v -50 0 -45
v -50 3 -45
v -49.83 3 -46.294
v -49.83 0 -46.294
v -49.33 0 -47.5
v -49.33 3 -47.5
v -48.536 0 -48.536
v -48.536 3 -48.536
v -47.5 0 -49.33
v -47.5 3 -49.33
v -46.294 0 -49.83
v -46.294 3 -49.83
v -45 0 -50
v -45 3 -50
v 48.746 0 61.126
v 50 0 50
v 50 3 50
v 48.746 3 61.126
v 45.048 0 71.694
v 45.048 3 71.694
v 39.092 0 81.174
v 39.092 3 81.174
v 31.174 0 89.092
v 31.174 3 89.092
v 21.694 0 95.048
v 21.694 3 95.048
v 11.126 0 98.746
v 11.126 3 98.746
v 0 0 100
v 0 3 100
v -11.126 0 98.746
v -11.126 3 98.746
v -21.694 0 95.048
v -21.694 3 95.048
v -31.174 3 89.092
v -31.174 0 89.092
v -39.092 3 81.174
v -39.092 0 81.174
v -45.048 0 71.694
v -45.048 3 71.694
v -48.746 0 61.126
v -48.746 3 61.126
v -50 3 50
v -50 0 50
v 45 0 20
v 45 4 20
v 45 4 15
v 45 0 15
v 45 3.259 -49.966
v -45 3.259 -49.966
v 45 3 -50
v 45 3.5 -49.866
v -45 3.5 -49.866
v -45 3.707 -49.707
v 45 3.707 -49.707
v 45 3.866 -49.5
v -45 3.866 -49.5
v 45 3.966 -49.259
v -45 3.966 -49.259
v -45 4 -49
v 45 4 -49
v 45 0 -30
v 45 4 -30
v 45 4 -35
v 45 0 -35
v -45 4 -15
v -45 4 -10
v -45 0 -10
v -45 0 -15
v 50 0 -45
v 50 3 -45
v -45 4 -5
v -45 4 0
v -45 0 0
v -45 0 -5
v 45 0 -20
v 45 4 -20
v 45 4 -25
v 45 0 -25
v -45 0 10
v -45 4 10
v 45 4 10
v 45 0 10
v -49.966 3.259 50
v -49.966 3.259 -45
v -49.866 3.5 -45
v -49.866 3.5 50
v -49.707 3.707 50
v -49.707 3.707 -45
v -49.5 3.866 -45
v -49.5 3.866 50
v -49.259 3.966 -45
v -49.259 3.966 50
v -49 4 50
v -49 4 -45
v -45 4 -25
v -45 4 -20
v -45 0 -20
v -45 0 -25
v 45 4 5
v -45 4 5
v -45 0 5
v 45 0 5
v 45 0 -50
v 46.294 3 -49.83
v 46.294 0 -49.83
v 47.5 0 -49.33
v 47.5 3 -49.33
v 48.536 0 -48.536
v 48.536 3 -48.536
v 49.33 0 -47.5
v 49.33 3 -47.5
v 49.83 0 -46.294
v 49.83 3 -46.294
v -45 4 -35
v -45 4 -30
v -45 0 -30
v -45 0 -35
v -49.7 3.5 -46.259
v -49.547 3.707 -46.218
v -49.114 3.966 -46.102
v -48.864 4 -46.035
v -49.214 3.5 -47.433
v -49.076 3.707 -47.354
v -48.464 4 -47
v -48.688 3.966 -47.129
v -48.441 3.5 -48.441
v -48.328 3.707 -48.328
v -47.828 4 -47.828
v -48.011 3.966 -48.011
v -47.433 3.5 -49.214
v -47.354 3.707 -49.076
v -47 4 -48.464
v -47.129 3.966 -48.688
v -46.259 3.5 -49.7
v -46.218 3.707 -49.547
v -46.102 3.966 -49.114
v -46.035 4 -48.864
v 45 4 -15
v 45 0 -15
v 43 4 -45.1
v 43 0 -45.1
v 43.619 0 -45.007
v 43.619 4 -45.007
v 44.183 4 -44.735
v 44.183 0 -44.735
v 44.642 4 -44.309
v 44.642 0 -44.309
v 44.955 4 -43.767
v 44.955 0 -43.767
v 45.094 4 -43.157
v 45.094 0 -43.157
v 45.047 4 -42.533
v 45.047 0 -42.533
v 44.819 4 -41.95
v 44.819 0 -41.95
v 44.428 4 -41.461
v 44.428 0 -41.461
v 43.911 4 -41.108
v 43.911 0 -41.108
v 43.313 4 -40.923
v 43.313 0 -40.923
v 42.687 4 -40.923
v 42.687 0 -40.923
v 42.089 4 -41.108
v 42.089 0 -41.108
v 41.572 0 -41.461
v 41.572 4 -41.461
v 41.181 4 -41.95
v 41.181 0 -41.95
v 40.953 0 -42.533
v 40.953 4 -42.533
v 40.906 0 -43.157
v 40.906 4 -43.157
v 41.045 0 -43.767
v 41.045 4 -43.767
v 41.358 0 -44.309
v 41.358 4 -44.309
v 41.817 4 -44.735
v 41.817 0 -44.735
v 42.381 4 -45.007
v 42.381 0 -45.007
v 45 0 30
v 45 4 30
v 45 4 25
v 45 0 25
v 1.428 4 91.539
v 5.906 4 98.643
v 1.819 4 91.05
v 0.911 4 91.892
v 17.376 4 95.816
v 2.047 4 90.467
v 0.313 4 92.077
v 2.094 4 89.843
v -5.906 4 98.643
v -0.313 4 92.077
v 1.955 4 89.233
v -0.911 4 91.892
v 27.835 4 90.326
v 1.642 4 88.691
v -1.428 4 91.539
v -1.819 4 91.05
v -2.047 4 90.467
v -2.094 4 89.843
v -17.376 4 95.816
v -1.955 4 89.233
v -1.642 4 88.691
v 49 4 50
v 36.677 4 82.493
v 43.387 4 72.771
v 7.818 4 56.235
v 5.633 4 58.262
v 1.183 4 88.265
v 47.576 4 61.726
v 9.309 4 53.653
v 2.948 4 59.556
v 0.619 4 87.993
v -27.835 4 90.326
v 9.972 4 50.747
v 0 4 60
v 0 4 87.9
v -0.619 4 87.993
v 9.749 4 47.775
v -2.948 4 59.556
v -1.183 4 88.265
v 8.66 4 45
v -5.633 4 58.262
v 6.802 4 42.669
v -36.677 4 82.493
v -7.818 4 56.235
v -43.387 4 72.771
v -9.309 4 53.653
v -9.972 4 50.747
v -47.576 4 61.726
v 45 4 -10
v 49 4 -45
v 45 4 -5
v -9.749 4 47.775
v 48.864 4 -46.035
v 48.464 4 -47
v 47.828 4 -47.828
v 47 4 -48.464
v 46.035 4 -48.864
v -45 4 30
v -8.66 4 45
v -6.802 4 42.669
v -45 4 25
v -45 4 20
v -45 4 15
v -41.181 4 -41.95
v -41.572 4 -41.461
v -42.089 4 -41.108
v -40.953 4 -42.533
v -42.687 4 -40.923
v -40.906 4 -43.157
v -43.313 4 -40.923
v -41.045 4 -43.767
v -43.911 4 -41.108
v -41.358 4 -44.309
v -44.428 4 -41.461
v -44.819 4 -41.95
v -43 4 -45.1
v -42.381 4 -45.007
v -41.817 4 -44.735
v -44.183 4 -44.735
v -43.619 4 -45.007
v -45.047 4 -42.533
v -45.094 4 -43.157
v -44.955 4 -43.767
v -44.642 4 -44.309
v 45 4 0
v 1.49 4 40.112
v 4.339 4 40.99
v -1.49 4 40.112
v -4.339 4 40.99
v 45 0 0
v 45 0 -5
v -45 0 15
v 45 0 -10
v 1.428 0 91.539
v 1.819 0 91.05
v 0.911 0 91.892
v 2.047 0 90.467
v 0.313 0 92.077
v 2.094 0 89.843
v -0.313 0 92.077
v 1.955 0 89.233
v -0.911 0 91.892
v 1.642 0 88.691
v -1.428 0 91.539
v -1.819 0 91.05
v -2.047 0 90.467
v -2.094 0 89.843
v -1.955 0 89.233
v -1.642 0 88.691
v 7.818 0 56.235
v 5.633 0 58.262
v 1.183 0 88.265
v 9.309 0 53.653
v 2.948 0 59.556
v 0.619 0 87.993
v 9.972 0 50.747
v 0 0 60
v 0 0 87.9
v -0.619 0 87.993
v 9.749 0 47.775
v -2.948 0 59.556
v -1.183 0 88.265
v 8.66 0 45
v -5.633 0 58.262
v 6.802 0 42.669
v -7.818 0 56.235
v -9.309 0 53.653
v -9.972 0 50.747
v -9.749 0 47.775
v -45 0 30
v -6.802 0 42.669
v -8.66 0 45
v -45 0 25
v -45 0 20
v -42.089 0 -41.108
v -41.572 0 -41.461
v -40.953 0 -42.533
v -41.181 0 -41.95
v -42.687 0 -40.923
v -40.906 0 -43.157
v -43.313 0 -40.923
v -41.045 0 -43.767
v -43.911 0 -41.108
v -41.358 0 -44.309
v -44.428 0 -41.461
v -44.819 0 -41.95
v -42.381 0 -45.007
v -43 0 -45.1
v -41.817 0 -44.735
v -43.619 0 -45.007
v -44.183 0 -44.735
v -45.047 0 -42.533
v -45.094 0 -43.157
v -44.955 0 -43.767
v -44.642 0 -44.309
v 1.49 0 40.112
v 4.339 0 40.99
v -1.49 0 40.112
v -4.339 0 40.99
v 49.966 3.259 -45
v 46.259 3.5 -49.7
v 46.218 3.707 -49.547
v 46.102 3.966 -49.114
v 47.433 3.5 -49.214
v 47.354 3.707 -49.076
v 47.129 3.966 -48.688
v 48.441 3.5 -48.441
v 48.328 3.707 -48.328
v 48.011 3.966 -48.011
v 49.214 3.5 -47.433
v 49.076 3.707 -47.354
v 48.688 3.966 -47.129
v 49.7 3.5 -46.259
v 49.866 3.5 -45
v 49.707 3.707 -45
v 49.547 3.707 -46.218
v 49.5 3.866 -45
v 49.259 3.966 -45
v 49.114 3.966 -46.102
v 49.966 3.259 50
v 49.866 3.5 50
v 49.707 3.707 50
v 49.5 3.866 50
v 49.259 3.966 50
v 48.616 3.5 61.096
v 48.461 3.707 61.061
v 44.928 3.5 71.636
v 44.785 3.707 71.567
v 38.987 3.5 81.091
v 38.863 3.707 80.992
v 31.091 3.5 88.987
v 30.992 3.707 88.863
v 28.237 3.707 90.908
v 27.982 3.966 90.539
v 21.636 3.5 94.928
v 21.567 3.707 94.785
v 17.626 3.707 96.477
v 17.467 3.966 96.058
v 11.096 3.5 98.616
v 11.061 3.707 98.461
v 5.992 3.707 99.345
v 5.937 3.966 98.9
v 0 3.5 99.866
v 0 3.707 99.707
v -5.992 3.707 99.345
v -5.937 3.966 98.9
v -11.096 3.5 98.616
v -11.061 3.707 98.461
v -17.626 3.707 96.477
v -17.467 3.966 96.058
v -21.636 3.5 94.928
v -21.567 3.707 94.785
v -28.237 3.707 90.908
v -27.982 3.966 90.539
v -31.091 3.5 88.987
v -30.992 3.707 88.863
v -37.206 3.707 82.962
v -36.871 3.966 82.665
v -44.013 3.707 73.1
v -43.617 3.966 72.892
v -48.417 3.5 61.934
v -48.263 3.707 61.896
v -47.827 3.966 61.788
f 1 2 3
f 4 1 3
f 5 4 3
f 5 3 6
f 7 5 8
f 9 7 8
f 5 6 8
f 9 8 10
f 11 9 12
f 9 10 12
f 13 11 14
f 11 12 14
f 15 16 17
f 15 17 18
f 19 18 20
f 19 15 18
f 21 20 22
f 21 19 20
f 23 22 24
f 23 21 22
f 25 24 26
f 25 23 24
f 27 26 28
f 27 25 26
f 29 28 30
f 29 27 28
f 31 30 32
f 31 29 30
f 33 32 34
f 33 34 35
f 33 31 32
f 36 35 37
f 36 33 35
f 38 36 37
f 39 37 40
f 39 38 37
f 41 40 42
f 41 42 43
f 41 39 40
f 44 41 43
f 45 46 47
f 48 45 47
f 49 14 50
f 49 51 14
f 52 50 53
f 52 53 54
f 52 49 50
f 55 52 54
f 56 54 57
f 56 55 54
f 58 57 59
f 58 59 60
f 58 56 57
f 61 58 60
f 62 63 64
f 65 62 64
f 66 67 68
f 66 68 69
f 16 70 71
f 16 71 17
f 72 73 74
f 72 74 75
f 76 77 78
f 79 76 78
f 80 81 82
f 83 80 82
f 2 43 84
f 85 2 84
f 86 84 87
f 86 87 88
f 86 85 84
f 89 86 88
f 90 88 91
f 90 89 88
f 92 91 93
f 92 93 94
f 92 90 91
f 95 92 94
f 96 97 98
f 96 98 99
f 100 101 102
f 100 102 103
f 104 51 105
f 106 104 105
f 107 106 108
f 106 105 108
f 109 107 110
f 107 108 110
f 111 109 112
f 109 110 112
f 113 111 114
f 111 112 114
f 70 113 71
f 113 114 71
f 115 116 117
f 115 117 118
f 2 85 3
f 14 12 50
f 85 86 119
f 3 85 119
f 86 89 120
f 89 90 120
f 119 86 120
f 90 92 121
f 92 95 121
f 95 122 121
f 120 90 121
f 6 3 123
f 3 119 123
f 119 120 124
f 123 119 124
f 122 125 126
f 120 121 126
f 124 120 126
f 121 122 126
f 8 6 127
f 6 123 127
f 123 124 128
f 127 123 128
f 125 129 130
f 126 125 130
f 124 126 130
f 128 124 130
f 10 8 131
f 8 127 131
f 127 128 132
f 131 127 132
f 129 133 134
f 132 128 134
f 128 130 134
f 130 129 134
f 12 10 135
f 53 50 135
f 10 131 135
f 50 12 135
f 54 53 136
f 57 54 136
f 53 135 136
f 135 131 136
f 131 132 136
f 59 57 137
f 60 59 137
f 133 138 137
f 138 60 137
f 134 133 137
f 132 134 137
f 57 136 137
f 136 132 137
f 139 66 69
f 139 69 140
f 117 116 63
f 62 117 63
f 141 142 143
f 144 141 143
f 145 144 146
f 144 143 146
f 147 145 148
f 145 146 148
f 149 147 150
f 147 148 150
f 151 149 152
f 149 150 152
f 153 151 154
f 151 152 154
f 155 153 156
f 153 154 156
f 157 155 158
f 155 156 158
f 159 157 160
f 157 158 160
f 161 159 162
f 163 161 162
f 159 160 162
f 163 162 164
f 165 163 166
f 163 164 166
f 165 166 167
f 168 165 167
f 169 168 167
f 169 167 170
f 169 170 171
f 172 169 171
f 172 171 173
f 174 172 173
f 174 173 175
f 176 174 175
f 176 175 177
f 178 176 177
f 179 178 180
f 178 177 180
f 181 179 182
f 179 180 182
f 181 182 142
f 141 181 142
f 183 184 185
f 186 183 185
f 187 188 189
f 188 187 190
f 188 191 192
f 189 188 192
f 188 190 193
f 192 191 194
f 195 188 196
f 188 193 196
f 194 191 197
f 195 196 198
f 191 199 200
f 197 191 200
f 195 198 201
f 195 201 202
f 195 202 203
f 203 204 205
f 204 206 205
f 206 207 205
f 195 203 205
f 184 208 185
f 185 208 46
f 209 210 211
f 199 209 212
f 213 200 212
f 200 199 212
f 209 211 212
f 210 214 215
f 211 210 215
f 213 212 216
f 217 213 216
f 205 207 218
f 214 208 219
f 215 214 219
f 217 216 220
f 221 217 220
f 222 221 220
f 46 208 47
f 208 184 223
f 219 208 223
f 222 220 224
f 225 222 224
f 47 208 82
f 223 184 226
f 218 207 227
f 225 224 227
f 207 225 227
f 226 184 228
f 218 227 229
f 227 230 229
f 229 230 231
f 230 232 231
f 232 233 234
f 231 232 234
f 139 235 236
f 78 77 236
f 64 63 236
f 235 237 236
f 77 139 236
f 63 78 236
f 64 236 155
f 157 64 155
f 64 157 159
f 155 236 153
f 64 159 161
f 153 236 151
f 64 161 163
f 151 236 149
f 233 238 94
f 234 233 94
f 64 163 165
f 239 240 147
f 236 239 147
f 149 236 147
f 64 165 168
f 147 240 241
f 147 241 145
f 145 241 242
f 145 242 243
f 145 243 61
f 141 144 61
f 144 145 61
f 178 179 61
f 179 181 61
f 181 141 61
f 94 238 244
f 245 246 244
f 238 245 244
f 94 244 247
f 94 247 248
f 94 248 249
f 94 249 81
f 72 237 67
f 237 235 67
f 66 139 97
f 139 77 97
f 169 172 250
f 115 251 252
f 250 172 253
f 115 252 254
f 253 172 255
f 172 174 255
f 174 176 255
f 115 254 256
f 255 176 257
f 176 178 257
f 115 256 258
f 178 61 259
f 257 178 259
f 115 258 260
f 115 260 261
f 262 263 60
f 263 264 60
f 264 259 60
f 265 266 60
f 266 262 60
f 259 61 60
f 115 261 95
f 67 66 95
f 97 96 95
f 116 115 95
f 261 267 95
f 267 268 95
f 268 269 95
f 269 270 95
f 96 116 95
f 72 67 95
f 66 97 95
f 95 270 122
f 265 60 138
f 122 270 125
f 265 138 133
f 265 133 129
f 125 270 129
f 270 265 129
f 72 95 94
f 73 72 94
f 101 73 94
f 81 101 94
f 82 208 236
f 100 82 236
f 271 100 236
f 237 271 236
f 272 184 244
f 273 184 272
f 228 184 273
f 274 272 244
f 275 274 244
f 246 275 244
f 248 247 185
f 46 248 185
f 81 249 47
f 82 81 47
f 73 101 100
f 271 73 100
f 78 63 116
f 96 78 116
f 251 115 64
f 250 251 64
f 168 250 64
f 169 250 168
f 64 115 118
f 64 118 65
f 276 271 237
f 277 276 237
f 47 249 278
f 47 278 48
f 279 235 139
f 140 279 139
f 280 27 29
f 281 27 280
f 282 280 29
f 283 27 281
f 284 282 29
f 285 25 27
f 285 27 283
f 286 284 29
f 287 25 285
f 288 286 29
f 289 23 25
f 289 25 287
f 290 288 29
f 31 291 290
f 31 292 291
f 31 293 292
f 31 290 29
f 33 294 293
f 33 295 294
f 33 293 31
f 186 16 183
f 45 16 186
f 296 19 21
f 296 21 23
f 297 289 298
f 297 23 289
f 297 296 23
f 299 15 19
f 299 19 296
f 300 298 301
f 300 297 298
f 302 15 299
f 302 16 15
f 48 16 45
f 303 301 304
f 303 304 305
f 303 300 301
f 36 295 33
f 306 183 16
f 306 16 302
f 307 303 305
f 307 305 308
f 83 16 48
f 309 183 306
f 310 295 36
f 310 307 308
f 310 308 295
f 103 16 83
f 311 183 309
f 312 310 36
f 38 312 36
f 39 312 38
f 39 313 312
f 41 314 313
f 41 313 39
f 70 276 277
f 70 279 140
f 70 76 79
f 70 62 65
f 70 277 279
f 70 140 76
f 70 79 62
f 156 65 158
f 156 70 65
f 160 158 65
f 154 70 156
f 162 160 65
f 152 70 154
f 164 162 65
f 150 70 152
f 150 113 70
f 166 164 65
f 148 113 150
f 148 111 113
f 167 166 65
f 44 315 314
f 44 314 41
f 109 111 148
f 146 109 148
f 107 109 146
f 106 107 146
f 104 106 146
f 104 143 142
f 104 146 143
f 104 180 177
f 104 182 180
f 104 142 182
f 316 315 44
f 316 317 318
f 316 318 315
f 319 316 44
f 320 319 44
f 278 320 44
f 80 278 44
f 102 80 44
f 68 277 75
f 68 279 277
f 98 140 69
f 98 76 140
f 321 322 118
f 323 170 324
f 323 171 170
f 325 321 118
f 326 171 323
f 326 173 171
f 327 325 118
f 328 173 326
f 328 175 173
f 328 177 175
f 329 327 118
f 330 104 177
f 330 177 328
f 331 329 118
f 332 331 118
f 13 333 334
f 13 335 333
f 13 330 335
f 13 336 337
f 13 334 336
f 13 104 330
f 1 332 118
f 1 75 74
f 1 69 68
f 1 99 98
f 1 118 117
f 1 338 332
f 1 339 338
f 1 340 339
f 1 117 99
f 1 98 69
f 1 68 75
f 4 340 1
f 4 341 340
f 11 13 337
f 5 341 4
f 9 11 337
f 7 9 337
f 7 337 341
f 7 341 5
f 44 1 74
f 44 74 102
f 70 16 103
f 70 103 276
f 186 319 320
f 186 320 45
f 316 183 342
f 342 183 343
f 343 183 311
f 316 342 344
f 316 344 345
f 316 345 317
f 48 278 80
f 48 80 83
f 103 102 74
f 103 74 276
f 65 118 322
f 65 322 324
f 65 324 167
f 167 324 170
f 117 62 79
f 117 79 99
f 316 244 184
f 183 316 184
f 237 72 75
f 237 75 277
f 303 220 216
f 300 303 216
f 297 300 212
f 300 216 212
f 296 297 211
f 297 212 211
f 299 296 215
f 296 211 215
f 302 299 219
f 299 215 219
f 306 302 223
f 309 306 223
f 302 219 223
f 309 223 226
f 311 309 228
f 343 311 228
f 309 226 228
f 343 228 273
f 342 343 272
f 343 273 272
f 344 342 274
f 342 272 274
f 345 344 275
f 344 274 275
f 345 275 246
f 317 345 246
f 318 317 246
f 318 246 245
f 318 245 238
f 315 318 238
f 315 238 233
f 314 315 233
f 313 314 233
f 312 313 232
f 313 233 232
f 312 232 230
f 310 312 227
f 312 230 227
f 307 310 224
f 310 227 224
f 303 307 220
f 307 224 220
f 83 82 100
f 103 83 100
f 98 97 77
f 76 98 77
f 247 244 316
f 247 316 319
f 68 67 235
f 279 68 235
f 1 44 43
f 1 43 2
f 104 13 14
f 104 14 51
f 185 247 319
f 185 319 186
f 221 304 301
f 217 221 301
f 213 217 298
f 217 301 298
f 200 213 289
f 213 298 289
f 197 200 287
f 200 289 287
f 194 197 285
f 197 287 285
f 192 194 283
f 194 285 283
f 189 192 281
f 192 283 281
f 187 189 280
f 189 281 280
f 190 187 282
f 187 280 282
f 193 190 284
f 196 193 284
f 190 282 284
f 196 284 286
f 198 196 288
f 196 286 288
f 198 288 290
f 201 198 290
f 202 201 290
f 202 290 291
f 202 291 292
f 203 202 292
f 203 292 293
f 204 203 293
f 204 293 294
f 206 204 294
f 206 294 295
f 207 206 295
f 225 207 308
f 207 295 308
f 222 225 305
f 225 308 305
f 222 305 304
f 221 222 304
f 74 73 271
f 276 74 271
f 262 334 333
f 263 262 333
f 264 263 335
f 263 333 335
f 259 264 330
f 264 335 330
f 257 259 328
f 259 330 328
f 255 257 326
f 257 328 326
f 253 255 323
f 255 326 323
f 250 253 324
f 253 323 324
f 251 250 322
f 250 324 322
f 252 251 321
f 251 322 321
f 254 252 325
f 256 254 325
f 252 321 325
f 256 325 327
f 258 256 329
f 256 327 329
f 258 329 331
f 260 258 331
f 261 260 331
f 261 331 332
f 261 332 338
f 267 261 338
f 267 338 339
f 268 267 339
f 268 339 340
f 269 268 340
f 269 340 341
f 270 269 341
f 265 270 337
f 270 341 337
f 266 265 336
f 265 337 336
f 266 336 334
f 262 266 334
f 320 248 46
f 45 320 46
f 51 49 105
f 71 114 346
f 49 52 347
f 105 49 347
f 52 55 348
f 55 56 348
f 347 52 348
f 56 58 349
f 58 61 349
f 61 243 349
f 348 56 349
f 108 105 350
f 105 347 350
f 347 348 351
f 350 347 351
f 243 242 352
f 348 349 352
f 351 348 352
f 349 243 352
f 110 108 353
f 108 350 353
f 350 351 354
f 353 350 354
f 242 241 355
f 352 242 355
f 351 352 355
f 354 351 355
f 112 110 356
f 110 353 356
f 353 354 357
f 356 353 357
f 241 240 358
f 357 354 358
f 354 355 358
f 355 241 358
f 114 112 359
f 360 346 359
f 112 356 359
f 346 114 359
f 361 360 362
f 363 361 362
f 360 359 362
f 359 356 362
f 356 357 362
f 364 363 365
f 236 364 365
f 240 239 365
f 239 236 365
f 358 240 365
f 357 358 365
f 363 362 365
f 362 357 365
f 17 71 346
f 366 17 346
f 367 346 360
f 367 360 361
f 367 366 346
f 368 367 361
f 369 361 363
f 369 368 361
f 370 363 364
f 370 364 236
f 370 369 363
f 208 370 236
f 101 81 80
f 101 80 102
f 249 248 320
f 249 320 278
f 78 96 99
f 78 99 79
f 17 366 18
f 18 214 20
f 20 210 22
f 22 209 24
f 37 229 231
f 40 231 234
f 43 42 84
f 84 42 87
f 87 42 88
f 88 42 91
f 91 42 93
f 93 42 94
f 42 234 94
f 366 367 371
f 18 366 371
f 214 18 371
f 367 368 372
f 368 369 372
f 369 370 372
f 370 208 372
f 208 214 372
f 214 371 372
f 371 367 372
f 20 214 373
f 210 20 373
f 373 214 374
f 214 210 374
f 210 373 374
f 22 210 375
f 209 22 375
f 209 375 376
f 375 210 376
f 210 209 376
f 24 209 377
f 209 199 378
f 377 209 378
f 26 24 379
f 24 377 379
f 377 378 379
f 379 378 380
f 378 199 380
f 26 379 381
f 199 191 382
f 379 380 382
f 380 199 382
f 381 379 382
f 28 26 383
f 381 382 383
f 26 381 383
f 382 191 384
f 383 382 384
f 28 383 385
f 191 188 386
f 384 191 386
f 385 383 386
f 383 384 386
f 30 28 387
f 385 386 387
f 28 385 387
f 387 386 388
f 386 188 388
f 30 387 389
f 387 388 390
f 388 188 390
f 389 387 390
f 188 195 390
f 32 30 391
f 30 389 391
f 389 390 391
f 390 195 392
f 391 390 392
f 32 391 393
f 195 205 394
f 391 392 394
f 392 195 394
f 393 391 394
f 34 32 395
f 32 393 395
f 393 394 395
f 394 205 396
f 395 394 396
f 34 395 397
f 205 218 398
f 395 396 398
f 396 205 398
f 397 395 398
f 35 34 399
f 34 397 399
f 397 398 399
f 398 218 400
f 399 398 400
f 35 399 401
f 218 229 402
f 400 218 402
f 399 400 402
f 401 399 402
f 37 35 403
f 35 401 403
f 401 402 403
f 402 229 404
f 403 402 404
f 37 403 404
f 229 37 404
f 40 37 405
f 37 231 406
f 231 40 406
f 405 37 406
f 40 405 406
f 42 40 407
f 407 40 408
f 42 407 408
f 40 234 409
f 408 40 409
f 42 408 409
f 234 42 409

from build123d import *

# Parameters (mm, degrees)
EXTRUDE_1_DEPTH     = 4
SKETCH_3_R          = 2.1
CUT_EXTRUDE_1_DEPTH = 4
SKETCH_4_R          = 10
CUT_EXTRUDE_2_DEPTH = 4
SKETCH_5_W          = 90
SKETCH_5_H          = 5
CUT_EXTRUDE_3_DEPTH = 5
FILLET_1_R          = 5
FILLET_2_R          = 1


with BuildPart() as part:
    # 草图2 → 凸台-拉伸1 (new body)
    with BuildSketch(Plane(origin=(0, 0, 0), x_dir=(1, 0, 0), z_dir=(0, 1, 0))):
        with BuildLine():
            Line((-50, -50), (-50, 50))
            Line((-50, 50), (50, 50))
            Line((50, 50), (50, -50))
            ThreePointArc((50, -50), (0, -100), (-50, -50))
        make_face()
    extrude(amount=EXTRUDE_1_DEPTH)

    # 草图3 → 切除-拉伸1 (cut)
    with BuildSketch(Plane.XZ):
        with Locations(Location((0, 90, 0), (0, 0, 270))):
            Circle(SKETCH_3_R)
        with Locations(Location((43, -43, 0), (0, 0, 270))):
            Circle(SKETCH_3_R)
        with Locations(Location((-43, -43, 0), (0, 0, 270))):
            Circle(SKETCH_3_R)
    extrude(amount=-CUT_EXTRUDE_1_DEPTH, mode=Mode.SUBTRACT)

    # 草图4 → 切除-拉伸2 (cut)
    with BuildSketch(Plane(origin=(0, 4, 0), x_dir=(1, 0, 0), z_dir=(0, 1, 0))):
        with Locations(Location((0, -50, 0), (0, 0, 270))):
            Circle(SKETCH_4_R)
    extrude(amount=-CUT_EXTRUDE_2_DEPTH, mode=Mode.SUBTRACT)

    # 草图5 → 切除-拉伸3 (cut)
    with BuildSketch(Plane(origin=(0, 4, 0), x_dir=(1, 0, 0), z_dir=(0, 1, 0))):
        with Locations((0, 32.5)):
            Rectangle(SKETCH_5_W, SKETCH_5_H)
        with Locations((0, 22.5)):
            Rectangle(SKETCH_5_W, SKETCH_5_H)
        with Locations((0, 12.5)):
            Rectangle(SKETCH_5_W, SKETCH_5_H)
        with Locations((0, 2.5)):
            Rectangle(SKETCH_5_W, SKETCH_5_H)
        with Locations((0, -7.5)):
            Rectangle(SKETCH_5_W, SKETCH_5_H)
        with Locations((0, -17.5)):
            Rectangle(SKETCH_5_W, SKETCH_5_H)
        with Locations((0, -27.5)):
            Rectangle(SKETCH_5_W, SKETCH_5_H)
    extrude(amount=-CUT_EXTRUDE_3_DEPTH, mode=Mode.SUBTRACT)

    # 圆角1
    fillet_1_edges = [part.edges().sort_by_distance(p)[0] for p in [
        (-50, 2, -50),
        (50, 2, -50),
    ]]
    fillet(fillet_1_edges, radius=FILLET_1_R)

    # 圆角2
    fillet_2_edges = [part.edges().sort_by_distance(p)[0] for p in [
        (0, 4, 100),
        (0, 4, -50),
        (-50, 4, 2.5),
        (-48.535533906, 4, -48.535533906),
        (48.535533906, 4, -48.535533906),
        (50, 4, 2.5),
    ]]
    fillet(fillet_2_edges, radius=FILLET_2_R)


solid = part.part
